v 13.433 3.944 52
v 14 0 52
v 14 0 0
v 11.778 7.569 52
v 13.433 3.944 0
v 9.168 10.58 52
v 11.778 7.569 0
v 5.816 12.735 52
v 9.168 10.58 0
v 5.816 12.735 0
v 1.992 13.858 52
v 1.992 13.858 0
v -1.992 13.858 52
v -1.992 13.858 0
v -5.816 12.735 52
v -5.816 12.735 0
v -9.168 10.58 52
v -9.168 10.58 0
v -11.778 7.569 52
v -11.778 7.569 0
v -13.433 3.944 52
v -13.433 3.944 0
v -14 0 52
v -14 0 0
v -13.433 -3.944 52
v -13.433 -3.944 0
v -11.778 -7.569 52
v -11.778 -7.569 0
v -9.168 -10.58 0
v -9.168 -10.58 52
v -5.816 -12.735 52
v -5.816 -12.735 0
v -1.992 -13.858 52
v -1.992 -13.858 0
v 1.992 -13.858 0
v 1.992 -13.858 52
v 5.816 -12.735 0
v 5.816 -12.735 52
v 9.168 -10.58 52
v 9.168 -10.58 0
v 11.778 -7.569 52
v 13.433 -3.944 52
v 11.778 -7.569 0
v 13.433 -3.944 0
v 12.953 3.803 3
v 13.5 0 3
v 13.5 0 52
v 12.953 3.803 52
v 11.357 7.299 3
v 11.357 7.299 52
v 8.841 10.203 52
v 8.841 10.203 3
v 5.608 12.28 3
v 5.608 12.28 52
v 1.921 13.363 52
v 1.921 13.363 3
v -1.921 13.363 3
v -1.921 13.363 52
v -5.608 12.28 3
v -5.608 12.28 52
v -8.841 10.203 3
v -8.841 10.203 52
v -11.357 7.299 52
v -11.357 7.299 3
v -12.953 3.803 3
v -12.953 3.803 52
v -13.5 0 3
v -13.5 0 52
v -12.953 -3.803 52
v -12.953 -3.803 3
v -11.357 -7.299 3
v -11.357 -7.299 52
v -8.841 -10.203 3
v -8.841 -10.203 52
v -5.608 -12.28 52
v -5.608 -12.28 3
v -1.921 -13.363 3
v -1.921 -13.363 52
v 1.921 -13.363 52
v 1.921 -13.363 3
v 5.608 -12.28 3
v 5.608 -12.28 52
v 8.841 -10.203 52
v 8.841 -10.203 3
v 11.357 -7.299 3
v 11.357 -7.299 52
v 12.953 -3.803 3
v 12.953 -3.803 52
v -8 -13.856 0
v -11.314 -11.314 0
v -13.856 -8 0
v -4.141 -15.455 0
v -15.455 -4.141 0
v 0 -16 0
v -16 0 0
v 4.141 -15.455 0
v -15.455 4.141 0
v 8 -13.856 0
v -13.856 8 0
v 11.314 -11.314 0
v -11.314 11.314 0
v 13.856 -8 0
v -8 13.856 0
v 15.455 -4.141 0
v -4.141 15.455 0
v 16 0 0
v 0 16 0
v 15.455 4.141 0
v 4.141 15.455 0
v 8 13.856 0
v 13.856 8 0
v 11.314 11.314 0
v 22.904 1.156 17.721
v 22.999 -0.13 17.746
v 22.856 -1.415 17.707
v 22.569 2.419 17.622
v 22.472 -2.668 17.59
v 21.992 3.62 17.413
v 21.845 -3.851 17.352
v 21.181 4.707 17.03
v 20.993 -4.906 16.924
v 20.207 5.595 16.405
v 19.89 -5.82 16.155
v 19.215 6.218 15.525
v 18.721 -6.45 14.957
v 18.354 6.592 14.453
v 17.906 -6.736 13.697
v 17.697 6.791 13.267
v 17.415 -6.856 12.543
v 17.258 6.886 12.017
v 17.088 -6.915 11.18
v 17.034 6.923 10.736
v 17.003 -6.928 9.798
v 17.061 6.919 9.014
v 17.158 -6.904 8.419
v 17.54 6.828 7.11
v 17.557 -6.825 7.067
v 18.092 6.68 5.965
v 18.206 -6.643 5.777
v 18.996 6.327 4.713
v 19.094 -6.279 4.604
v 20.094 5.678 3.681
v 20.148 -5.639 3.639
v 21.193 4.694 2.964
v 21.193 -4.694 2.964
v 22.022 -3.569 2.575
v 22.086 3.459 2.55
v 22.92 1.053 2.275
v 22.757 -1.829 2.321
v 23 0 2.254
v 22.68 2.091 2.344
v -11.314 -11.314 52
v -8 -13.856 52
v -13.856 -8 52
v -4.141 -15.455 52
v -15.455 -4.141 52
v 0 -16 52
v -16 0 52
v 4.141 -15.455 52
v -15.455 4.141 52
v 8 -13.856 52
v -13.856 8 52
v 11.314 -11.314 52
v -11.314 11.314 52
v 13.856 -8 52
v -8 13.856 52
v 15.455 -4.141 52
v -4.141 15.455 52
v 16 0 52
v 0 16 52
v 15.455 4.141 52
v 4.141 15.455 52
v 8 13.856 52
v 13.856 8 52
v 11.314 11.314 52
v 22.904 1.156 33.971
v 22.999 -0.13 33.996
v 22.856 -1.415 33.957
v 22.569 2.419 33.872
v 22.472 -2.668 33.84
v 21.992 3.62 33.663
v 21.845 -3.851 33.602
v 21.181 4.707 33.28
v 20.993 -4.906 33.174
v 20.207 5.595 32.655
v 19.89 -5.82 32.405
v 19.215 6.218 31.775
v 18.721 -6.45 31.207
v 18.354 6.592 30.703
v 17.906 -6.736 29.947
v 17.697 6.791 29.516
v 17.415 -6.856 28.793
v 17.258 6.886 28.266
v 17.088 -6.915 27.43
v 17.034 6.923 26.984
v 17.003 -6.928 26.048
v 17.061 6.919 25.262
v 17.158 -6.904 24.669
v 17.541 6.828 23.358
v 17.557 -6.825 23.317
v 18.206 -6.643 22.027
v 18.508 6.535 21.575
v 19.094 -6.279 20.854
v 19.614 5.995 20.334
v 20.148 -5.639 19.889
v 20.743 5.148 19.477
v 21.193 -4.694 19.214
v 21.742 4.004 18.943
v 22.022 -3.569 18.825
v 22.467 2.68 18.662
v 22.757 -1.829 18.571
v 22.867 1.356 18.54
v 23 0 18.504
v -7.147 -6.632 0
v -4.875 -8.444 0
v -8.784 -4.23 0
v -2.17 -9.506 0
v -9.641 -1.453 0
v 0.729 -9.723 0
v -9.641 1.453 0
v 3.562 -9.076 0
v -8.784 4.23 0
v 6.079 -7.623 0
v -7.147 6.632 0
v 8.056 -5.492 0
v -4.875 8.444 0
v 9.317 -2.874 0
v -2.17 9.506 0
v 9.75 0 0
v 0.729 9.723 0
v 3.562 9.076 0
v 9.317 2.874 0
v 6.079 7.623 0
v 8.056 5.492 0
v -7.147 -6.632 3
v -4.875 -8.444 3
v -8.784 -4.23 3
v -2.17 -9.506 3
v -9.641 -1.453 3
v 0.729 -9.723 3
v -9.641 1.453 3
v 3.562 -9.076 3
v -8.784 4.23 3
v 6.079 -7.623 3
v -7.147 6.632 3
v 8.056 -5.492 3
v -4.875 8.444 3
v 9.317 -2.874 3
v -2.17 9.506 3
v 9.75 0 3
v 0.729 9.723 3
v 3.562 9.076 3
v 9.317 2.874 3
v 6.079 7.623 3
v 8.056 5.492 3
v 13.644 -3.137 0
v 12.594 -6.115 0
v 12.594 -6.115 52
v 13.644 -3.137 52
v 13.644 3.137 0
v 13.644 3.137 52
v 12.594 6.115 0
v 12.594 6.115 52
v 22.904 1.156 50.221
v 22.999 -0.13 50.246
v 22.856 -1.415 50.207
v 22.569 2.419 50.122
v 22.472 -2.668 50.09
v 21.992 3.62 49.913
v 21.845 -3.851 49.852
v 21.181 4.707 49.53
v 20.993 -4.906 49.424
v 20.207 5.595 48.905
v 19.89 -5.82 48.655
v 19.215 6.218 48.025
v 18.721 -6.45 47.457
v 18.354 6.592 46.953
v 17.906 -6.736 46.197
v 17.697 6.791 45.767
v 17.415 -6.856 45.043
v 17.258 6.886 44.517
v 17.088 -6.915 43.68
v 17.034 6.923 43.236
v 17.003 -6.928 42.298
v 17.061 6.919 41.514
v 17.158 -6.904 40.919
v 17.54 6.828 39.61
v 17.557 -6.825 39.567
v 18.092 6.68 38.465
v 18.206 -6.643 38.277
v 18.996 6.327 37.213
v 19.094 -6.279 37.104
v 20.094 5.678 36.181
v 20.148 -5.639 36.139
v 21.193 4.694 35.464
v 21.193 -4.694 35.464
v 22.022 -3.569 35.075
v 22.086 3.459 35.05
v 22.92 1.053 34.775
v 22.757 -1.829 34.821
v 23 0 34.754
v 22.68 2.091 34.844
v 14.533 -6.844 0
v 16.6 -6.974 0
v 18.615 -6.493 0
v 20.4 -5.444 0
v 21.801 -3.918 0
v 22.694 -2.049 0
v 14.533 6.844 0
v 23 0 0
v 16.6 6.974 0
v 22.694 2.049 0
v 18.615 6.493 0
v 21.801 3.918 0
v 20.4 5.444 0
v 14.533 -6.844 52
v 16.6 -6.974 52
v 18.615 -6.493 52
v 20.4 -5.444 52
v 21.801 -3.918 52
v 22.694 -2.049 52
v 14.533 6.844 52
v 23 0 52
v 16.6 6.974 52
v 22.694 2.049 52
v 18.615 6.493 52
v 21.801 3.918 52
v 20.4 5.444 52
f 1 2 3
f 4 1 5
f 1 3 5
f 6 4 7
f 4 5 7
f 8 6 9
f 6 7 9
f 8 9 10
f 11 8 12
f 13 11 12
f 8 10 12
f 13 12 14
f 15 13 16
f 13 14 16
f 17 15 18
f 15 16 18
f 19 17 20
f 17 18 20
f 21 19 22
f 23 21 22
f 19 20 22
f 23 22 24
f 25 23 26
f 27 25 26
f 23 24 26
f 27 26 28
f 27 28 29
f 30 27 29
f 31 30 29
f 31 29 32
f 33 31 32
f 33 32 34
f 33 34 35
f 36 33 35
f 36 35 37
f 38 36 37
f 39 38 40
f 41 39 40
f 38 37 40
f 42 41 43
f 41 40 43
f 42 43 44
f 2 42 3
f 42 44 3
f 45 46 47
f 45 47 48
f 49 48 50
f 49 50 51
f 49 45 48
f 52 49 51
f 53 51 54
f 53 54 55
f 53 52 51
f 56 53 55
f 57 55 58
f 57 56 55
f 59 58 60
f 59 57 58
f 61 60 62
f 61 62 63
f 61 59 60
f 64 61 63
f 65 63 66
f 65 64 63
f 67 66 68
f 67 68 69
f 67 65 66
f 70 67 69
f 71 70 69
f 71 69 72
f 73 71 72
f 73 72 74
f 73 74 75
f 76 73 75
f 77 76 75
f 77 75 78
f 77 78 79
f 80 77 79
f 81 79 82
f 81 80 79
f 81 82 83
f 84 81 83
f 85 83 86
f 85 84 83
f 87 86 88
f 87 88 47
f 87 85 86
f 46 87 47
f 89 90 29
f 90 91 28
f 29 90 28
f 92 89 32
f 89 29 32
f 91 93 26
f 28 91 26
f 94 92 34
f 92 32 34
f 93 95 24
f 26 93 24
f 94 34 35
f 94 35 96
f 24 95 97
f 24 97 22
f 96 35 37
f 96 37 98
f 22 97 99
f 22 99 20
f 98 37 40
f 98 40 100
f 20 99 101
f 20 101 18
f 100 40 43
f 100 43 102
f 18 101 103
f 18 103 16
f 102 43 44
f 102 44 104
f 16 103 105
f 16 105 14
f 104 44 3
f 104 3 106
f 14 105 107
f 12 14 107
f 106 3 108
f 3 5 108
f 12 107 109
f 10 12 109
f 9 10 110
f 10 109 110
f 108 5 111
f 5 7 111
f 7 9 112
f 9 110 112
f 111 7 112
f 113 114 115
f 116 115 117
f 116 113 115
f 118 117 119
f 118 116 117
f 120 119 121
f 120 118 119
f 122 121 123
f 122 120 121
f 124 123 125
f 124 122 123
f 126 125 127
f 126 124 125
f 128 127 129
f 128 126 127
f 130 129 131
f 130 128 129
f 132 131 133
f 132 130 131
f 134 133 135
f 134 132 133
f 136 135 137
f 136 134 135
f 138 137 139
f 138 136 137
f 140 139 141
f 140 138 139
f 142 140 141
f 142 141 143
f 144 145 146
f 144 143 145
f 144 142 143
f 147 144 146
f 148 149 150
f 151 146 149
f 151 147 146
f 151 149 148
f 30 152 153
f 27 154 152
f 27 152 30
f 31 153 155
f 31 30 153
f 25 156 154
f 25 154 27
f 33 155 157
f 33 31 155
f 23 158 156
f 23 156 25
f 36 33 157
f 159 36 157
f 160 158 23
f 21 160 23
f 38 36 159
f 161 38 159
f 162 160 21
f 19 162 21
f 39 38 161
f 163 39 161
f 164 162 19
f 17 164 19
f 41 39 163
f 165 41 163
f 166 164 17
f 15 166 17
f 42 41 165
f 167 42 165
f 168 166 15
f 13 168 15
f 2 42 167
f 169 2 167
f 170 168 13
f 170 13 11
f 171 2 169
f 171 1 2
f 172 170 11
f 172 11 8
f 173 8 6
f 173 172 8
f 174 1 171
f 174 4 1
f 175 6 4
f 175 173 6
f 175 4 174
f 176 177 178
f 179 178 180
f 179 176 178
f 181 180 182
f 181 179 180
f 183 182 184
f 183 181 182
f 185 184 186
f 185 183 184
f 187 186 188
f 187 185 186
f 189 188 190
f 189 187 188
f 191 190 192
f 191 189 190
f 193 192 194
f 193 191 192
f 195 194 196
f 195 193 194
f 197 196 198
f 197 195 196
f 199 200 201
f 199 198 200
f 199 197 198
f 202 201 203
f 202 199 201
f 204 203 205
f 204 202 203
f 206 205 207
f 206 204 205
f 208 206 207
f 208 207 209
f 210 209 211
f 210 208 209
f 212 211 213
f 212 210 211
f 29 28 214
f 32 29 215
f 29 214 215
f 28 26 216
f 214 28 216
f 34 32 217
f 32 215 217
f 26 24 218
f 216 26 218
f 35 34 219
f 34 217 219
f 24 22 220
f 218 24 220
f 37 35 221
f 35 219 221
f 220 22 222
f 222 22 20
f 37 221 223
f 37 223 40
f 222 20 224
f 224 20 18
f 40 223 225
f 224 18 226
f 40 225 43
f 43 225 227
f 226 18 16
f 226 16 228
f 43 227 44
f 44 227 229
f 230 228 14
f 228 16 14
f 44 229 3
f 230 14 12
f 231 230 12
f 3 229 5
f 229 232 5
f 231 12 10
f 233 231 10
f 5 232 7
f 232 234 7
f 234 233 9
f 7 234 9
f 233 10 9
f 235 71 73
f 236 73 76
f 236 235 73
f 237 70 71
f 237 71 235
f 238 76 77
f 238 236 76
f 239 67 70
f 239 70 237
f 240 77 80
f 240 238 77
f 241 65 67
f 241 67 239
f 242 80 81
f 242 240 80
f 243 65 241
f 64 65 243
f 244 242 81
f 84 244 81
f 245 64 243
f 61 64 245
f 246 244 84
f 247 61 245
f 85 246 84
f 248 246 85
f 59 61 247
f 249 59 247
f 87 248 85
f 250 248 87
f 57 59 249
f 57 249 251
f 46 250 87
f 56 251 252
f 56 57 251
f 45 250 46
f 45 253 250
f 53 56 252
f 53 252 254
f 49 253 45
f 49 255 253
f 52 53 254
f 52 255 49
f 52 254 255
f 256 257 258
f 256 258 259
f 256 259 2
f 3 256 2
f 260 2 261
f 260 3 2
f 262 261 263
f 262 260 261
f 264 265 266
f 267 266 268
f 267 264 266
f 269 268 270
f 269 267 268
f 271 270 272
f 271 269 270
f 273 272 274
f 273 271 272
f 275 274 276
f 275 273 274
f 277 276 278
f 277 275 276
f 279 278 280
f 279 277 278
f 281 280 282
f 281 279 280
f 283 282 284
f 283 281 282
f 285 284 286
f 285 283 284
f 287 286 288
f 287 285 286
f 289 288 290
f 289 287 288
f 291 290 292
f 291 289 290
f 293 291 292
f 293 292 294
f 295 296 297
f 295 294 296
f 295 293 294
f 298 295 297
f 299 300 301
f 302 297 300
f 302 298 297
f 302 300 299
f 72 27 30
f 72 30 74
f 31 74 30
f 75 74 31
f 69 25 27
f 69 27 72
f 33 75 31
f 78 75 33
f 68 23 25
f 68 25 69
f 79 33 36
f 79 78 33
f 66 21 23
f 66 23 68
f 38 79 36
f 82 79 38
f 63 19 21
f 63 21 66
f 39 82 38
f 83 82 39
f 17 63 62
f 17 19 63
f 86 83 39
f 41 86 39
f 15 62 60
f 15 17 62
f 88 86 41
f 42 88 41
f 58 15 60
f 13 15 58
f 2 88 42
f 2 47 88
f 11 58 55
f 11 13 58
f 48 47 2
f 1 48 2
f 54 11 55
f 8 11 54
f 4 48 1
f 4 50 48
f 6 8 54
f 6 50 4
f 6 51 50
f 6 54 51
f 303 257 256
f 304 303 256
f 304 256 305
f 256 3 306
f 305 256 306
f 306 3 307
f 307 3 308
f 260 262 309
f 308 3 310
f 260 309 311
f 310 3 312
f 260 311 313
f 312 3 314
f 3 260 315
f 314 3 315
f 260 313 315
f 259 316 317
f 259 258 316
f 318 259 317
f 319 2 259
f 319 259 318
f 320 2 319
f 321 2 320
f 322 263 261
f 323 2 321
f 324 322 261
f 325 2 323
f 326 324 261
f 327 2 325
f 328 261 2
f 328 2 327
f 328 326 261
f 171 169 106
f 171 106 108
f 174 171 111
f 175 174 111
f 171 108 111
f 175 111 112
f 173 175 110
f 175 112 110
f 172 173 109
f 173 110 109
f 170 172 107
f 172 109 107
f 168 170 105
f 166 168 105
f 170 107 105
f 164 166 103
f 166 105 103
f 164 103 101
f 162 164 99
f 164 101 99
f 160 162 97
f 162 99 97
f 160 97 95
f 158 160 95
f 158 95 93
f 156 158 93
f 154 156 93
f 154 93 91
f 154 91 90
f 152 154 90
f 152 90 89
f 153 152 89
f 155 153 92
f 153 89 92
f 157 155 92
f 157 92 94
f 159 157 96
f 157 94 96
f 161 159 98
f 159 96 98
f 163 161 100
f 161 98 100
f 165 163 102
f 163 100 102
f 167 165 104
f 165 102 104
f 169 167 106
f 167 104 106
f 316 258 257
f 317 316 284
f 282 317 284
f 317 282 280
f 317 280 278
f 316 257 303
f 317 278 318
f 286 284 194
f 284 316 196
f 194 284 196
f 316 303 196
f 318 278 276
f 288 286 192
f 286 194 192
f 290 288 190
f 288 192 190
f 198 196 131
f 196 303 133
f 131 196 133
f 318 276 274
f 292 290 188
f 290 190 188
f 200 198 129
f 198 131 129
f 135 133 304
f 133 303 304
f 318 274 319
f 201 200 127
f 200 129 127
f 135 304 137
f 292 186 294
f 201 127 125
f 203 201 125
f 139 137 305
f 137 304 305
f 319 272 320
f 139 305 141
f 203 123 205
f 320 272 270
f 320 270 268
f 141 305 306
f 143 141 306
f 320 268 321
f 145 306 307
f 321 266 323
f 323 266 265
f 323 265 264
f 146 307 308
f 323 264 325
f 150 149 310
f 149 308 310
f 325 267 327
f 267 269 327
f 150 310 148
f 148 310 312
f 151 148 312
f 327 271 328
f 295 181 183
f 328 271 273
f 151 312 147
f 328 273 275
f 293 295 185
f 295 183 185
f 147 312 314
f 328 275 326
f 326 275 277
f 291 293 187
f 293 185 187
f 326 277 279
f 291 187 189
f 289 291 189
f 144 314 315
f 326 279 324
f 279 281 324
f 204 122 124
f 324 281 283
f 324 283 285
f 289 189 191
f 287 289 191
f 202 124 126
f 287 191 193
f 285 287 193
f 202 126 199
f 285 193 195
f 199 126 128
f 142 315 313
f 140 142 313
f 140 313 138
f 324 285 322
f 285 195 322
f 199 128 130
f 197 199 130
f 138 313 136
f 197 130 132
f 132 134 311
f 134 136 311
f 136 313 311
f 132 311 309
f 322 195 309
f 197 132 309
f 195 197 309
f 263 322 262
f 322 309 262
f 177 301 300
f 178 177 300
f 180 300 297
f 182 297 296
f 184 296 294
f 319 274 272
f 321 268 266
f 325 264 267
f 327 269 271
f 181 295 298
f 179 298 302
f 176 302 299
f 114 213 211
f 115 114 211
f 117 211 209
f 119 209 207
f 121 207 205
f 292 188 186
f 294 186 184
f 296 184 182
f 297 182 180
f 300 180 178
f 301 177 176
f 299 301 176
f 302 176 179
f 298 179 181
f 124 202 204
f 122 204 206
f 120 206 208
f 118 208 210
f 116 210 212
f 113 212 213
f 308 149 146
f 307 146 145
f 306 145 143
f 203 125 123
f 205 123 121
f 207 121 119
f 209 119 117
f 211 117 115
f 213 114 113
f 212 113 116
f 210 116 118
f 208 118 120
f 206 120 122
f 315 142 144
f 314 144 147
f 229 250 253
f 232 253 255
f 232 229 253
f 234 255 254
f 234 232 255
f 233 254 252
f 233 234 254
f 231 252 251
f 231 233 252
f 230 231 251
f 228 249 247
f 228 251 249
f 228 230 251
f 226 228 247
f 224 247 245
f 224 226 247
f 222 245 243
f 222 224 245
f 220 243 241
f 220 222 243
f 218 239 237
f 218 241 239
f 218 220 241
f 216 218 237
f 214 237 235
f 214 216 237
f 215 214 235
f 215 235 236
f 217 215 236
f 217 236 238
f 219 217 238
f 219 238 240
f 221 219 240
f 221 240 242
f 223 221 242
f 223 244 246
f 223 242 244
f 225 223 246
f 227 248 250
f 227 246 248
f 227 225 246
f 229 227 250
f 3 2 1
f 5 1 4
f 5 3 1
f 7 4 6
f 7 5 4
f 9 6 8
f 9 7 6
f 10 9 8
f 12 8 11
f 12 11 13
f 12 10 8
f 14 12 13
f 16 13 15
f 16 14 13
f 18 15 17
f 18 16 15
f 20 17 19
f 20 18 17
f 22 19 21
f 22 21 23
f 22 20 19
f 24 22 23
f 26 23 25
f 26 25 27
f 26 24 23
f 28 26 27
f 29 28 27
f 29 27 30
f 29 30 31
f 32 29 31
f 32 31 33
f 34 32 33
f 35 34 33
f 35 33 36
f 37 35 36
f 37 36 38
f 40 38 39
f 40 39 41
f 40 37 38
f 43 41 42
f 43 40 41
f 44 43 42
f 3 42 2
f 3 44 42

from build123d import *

# Parameters (mm, degrees)
CYLINDER007_R     = 13.5
CYLINDER007_DEPTH = 49
CYLINDER_R        = 9.75
CYLINDER_DEPTH    = 52
CYLINDER001_R     = 12
CYLINDER001_DEPTH = 49
CYLINDER002_R     = 14
CYLINDER002_DEPTH = 52
CYLINDER006_R     = 14
CYLINDER006_DEPTH = 52
CYLINDER008_R     = 16
CYLINDER008_DEPTH = 52
CYLINDER013_R     = 8
CYLINDER013_DEPTH = 14
CYLINDER012_R     = 8
CYLINDER012_DEPTH = 14
CYLINDER011_R     = 8
CYLINDER011_DEPTH = 14
CYLINDER010_R     = 14
CYLINDER010_DEPTH = 52
CYLINDER009_R     = 7
CYLINDER009_DEPTH = 52


with BuildPart() as cylinder:
    # Cylinder007 → Cylinder007 (new body)
    with BuildSketch(Plane.XY.offset(3)):
        Circle(CYLINDER007_R)
    extrude(amount=CYLINDER007_DEPTH)


with BuildPart() as power_button:
    # Cylinder → Cylinder (new body)
    with BuildSketch(Plane.XY):
        Circle(CYLINDER_R)
    extrude(amount=CYLINDER_DEPTH)


with BuildPart() as cylinder001:
    # Cylinder001 → Cylinder001 (new body)
    with BuildSketch(Plane.XY.offset(3)):
        Circle(CYLINDER001_R)
    extrude(amount=CYLINDER001_DEPTH)


with BuildPart() as cut002:
    # Cylinder002 → Cylinder002 (new body)
    with BuildSketch(Plane.XY):
        Circle(CYLINDER002_R)
    extrude(amount=CYLINDER002_DEPTH)

    # Cut: cut Cylinder001
    add(cylinder001.part, mode=Mode.SUBTRACT)

    # Cut001: cut Power Button
    add(power_button.part, mode=Mode.SUBTRACT)

    # Cut002: cut Cylinder
    add(cylinder.part, mode=Mode.SUBTRACT)


with BuildPart() as cylinder006:
    # Cylinder006 → Cylinder006 (new body)
    with BuildSketch(Plane.XY):
        Circle(CYLINDER006_R)
    extrude(amount=CYLINDER006_DEPTH)


with BuildPart() as cut003:
    # Cylinder008 → Cylinder008 (new body)
    with BuildSketch(Plane.XY):
        Circle(CYLINDER008_R)
    extrude(amount=CYLINDER008_DEPTH)

    # Cut003: cut Cylinder006
    add(cylinder006.part, mode=Mode.SUBTRACT)


with BuildPart() as cylinder013:
    # Cylinder013 → Cylinder013 (new body)
    with BuildSketch(Plane(origin=(25, 7, 42.5), x_dir=(1, 0, 0), z_dir=(0, -1, 0))):
        Circle(CYLINDER013_R)
    extrude(amount=CYLINDER013_DEPTH)


with BuildPart() as cylinder012:
    # Cylinder012 → Cylinder012 (new body)
    with BuildSketch(Plane(origin=(25, 7, 26.25), x_dir=(1, 0, 0), z_dir=(0, -1, 0))):
        Circle(CYLINDER012_R)
    extrude(amount=CYLINDER012_DEPTH)


with BuildPart() as cylinder011:
    # Cylinder011 → Cylinder011 (new body)
    with BuildSketch(Plane(origin=(25, 7, 10), x_dir=(1, 0, 0), z_dir=(0, -1, 0))):
        Circle(CYLINDER011_R)
    extrude(amount=CYLINDER011_DEPTH)


with BuildPart() as cylinder010:
    # Cylinder010 → Cylinder010 (new body)
    with BuildSketch(Plane.XY):
        Circle(CYLINDER010_R)
    extrude(amount=CYLINDER010_DEPTH)


with BuildPart() as cut007:
    # Cylinder009 → Cylinder009 (new body)
    with BuildSketch(Plane(origin=(16, 0, 0), x_dir=(1, 0, 0), z_dir=(0, 0, 1))):
        Circle(CYLINDER009_R)
    extrude(amount=CYLINDER009_DEPTH)

    # Cut004: cut Cylinder010
    add(cylinder010.part, mode=Mode.SUBTRACT)

    # Cut005: cut Cylinder011
    add(cylinder011.part, mode=Mode.SUBTRACT)

    # Cut006: cut Cylinder012
    add(cylinder012.part, mode=Mode.SUBTRACT)

    # Cut007: cut Cylinder013
    add(cylinder013.part, mode=Mode.SUBTRACT)


solid = Compound([cut002.part, cut003.part, cut007.part])
